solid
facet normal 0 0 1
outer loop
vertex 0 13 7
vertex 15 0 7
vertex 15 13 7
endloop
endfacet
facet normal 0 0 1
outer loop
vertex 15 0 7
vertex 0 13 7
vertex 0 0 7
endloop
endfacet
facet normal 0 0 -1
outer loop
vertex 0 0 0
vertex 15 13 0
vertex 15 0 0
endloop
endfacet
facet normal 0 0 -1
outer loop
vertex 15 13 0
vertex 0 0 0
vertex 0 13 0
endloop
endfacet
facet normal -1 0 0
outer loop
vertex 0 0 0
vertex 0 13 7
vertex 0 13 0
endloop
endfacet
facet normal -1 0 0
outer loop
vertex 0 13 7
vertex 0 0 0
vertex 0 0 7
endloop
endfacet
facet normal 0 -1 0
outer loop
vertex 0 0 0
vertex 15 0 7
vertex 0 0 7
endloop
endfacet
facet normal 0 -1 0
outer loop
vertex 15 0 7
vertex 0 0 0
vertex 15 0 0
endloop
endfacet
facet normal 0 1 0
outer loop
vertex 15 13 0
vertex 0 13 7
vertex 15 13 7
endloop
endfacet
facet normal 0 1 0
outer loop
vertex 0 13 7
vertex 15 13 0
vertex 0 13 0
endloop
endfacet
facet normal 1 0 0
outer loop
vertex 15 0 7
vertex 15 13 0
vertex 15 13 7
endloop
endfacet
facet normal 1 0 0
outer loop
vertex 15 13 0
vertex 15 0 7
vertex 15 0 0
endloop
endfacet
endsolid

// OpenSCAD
translate([1.5, 2.5, 3.5]) color([0.6480049557775331, 0.6874717059379091, 0.14801928734251768]) cube([3, 5, 7], center=true);
translate([1.5, 7.5, 3.5]) color([0.93323205939552, 0.14750072005511716, 0.31607169754224296]) cube([3, 5, 7], center=true);
translate([3.5, 11.5, 2.5]) color([0.2088660889148145, 0.1868244368145192, 0.3491672112743387]) cube([7, 3, 5], center=true);
translate([2.5, 11.5, 6.0]) color([0.9834841816788549, 0.427290207198605, 0.49195852420878716]) cube([5, 3, 2], center=true);
translate([4.5, 2.5, 3.5]) color([0.7297831417632067, 0.7955834433152874, 0.43927203819181504]) cube([3, 5, 7], center=true);
translate([4.5, 7.5, 3.5]) color([0.2042687131951023, 0.709997013582239, 0.9058221085991531]) cube([3, 5, 7], center=true);
translate([7.5, 11.5, 6.0]) color([0.03327924187503195, 0.6331757983912308, 0.8710093735661795]) cube([5, 3, 2], center=true);
translate([7.5, 2.5, 3.5]) color([0.3636101637556439, 0.7431628081058981, 0.6774926049513658]) cube([3, 5, 7], center=true);
translate([7.5, 7.5, 3.5]) color([0.23306417175218364, 0.2975271762349214, 0.0866296567389645]) cube([3, 5, 7], center=true);
translate([8.0, 11.5, 2.5]) color([0.8688435220131177, 0.7514921149941085, 0.7714305883456576]) cube([2, 3, 5], center=true);
translate([10.5, 2.5, 3.5]) color([0.8829516943772963, 0.4114323292545551, 0.05394001775890156]) cube([3, 5, 7], center=true);
translate([10.5, 7.5, 3.5]) color([0.696805048854085, 0.6656296547984208, 0.6485122289860075]) cube([3, 5, 7], center=true);
translate([10.0, 11.5, 2.5]) color([0.5471816206705559, 0.7344166333532061, 0.4306045068871984]) cube([2, 3, 5], center=true);
translate([12.5, 11.5, 6.0]) color([0.45460236437769275, 0.25475221651879554, 0.47565246533915095]) cube([5, 3, 2], center=true);
translate([12.0, 11.5, 2.5]) color([0.3371942584654095, 0.04223511400675217, 0.05255331220371673]) cube([2, 3, 5], center=true);
translate([13.5, 2.5, 3.5]) color([0.34980223330761895, 0.2898096938030986, 0.007130057665757694]) cube([3, 5, 7], center=true);
translate([13.5, 7.5, 3.5]) color([0.06369015415518986, 0.42774457246440645, 0.22216650821772055]) cube([3, 5, 7], center=true);
translate([14.0, 11.5, 2.5]) color([0.6086379170158094, 0.557768500755667, 0.22097295115667703]) cube([2, 3, 5], center=true);
